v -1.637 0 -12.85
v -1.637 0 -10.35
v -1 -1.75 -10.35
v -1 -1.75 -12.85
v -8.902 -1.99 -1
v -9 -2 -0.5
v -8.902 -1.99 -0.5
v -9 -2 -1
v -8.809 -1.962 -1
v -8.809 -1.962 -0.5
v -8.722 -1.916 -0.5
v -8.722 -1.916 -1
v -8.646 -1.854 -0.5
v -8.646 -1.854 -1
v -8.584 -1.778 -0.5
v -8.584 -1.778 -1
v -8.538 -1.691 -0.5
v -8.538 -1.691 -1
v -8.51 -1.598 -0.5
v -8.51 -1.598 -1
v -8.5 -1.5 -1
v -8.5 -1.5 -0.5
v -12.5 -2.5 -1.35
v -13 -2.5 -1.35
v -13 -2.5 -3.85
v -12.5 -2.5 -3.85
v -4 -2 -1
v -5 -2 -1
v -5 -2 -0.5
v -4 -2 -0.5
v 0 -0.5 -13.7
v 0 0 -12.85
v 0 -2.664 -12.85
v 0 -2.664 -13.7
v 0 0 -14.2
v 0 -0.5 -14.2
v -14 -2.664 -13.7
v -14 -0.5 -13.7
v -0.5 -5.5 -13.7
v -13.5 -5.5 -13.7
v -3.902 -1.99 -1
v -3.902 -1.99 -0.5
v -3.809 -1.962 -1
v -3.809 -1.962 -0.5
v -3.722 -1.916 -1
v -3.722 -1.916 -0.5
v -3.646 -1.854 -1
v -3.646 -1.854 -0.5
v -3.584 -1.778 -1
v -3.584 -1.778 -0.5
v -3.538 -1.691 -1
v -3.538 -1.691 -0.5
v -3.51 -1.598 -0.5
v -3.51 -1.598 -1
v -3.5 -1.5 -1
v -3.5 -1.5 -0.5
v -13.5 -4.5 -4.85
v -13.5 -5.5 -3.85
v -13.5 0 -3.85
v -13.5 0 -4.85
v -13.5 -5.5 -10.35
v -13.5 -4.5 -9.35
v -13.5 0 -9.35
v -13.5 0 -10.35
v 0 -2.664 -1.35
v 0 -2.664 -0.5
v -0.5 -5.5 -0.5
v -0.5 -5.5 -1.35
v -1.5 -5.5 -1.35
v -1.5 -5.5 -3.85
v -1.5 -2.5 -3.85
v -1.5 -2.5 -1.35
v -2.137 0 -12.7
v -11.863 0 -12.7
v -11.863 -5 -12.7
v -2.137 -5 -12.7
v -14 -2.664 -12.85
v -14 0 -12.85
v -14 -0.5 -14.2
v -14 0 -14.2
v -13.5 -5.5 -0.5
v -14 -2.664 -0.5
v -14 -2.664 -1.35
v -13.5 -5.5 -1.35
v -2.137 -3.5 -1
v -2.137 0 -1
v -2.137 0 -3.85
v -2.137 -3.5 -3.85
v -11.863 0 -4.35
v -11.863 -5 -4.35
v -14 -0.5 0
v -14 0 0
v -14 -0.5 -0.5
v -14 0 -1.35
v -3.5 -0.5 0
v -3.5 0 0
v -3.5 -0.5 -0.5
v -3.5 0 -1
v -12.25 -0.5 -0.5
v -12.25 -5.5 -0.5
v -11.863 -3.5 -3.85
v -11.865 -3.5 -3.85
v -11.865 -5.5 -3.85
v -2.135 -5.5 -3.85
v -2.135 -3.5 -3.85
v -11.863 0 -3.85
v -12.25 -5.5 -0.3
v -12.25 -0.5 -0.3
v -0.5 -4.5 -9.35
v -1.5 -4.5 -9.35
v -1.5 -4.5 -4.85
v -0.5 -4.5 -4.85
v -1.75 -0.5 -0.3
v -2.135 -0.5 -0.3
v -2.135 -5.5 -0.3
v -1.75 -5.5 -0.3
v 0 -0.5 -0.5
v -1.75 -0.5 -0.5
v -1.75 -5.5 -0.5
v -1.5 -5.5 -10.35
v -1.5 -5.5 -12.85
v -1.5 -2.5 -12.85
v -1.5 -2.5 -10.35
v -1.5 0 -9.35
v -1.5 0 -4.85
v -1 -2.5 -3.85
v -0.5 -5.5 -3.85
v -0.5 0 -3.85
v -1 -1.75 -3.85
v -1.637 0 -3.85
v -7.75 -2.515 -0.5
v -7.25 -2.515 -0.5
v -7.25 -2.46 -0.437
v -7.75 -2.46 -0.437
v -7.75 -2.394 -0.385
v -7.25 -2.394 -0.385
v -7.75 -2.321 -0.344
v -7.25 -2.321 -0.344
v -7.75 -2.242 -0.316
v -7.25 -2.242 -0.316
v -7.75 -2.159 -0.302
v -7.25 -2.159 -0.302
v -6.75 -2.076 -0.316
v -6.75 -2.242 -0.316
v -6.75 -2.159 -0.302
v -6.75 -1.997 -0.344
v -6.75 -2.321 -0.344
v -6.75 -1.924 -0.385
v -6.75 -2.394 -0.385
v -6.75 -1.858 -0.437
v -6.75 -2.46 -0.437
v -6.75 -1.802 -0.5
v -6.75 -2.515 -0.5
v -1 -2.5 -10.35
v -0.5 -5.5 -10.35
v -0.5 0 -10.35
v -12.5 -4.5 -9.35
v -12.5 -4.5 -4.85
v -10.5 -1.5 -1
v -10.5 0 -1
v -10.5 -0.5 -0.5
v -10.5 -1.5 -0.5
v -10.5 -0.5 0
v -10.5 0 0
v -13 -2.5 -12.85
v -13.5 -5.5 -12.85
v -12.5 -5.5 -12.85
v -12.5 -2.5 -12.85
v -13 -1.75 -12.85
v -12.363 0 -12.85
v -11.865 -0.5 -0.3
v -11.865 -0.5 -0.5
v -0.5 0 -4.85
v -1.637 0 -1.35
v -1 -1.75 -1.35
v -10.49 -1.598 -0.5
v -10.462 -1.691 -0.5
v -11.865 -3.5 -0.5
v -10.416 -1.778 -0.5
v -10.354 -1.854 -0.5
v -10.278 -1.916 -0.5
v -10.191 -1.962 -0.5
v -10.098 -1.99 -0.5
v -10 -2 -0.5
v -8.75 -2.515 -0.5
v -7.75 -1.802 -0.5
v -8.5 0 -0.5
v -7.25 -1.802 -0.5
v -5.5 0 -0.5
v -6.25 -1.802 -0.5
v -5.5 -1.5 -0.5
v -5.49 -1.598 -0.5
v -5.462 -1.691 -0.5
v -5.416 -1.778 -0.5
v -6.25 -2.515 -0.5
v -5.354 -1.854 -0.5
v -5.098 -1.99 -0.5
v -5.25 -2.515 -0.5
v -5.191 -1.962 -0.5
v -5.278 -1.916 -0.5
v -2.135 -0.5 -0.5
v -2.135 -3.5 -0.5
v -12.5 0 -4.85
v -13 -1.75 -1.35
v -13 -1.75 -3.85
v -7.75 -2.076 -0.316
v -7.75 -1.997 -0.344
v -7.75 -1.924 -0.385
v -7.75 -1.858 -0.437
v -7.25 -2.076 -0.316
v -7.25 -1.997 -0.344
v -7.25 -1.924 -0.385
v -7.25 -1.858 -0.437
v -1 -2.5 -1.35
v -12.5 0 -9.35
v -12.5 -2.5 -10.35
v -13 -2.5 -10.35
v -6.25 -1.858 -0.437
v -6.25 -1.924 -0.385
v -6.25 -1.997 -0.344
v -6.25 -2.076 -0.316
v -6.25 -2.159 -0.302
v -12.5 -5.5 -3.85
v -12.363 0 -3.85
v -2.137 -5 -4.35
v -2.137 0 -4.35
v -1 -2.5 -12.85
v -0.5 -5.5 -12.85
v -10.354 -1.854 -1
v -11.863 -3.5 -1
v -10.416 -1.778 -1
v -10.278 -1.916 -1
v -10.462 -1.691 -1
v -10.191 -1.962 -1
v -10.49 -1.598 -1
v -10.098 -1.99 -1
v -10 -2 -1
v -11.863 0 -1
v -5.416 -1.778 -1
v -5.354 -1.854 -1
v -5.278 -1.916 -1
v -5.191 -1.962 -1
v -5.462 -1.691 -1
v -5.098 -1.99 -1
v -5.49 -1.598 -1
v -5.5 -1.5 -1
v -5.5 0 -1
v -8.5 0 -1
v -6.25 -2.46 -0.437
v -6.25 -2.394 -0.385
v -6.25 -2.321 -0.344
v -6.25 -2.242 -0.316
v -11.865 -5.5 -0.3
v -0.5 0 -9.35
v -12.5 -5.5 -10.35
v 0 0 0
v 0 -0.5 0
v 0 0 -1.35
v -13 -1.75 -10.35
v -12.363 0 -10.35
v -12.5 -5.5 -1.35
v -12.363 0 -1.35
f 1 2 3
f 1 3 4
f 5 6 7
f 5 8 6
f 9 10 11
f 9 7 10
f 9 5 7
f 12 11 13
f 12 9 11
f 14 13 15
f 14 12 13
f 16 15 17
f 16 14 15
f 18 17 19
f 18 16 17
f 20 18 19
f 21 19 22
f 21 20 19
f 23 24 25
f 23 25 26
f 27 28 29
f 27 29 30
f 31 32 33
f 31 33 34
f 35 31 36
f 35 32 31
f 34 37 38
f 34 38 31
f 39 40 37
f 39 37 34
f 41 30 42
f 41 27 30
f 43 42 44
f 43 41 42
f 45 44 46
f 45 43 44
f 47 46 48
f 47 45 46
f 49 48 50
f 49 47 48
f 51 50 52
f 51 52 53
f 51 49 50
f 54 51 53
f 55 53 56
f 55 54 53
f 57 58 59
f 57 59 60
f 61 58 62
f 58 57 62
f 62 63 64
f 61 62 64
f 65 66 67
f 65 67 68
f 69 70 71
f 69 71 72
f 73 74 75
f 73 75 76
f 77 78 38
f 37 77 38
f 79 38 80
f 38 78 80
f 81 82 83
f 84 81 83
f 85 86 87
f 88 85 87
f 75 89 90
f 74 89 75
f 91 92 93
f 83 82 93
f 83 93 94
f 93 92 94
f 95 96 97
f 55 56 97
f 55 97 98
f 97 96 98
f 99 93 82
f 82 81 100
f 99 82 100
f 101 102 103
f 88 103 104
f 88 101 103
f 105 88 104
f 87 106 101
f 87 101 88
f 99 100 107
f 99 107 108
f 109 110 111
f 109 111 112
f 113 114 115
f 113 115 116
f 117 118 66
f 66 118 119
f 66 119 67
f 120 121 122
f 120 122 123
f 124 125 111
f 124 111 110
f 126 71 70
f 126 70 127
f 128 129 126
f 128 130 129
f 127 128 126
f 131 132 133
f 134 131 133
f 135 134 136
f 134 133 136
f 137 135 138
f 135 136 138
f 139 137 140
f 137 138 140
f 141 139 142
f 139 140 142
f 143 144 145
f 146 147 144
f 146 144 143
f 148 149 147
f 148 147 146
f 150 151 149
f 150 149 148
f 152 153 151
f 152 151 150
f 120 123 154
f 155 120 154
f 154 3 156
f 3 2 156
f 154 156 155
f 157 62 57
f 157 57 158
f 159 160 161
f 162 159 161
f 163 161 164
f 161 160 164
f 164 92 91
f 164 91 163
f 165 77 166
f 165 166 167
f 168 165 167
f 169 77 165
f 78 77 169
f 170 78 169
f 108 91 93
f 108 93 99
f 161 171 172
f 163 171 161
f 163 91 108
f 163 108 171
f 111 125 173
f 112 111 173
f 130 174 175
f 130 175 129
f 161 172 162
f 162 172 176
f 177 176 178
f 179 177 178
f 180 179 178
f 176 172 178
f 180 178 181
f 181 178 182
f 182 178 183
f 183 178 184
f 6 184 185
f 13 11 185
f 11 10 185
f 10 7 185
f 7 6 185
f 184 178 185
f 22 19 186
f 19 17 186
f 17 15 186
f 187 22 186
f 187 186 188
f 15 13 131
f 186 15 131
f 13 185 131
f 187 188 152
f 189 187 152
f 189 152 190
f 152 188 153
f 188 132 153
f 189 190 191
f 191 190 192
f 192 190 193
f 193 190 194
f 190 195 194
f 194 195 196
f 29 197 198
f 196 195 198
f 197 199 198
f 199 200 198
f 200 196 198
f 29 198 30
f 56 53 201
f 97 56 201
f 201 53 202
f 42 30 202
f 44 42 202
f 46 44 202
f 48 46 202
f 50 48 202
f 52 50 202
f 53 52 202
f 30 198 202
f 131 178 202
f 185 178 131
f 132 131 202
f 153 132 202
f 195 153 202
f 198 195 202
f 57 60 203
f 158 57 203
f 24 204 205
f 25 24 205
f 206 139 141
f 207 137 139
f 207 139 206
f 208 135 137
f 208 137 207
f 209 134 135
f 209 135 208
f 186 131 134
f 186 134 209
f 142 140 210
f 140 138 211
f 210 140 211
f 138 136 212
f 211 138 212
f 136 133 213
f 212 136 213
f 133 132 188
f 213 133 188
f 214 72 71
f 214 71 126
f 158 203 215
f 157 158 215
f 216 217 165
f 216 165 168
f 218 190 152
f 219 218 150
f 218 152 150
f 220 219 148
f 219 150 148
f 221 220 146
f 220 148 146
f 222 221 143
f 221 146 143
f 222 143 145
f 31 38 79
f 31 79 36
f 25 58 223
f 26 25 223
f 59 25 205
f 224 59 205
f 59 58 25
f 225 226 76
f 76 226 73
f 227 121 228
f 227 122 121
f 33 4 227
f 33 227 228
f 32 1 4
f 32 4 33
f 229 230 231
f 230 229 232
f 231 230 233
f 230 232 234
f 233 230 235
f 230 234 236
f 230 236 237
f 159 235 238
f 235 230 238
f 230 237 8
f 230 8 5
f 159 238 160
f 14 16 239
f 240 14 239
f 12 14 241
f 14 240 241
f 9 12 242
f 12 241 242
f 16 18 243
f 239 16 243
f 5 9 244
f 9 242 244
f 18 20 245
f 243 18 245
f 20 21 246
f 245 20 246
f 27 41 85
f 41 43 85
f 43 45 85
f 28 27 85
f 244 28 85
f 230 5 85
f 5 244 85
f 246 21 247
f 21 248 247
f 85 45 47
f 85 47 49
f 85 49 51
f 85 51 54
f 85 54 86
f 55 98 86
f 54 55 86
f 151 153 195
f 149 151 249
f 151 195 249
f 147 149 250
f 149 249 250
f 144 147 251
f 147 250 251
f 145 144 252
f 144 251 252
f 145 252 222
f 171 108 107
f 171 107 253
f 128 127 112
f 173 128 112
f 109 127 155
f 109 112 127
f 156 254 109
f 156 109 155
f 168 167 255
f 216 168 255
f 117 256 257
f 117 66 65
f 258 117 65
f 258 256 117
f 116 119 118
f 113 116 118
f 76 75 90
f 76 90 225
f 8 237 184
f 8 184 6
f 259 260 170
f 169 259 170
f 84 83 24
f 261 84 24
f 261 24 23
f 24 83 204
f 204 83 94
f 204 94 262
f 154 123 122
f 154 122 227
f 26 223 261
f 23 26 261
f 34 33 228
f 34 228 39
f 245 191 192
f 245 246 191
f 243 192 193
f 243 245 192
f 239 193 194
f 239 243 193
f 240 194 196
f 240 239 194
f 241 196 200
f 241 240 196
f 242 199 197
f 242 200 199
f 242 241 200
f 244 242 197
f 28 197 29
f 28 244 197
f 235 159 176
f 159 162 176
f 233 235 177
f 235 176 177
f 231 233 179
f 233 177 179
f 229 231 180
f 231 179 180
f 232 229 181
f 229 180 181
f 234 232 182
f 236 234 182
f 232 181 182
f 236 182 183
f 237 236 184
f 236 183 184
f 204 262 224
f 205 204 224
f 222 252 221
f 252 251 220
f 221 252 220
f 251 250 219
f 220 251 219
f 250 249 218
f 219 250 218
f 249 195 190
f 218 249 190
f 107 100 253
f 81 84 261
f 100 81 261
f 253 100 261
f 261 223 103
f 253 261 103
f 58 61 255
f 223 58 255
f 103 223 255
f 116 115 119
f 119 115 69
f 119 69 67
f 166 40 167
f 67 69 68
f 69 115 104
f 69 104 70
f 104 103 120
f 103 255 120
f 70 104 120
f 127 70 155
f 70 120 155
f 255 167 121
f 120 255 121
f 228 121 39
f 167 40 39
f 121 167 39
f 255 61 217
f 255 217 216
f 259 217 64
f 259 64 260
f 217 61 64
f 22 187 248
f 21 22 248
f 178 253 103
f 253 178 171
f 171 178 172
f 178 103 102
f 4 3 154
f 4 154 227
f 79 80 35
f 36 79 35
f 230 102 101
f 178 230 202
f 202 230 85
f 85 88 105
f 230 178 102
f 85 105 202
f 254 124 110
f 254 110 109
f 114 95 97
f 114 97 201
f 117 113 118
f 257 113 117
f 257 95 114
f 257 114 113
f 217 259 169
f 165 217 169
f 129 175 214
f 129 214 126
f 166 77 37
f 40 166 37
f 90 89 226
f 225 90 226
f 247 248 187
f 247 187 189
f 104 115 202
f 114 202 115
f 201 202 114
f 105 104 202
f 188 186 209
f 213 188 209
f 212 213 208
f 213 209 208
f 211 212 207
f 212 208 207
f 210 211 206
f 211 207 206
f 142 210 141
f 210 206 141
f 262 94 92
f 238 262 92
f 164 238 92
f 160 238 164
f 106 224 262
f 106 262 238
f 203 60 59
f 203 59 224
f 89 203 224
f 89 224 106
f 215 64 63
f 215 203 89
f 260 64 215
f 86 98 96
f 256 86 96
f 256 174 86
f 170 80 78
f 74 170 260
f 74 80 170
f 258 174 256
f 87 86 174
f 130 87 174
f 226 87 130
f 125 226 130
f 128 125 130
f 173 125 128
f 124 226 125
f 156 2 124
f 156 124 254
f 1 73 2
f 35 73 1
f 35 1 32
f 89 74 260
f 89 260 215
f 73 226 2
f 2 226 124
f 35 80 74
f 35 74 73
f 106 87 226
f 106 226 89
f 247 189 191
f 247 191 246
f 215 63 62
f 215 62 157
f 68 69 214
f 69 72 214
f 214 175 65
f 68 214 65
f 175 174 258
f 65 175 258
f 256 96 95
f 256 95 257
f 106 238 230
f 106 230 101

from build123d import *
from OCP.BRepFilletAPI import BRepFilletAPI_MakeChamfer

# Parameters (mm, degrees)
SKETCH1_W           = 14
SKETCH1_H           = 14.2
BOSS_EXTRUDE2_DEPTH = 5.5
SKETCH2_W           = 1
SKETCH2_H           = 2.5
CUT_EXTRUDE1_DEPTH  = 2.5
SKETCH3_W           = 1.5
SKETCH3_H           = 2.5
CUT_EXTRUDE2_DEPTH  = 3
SKETCH4_W           = 0.5
SKETCH4_H           = 6.5
CUT_EXTRUDE3_DEPTH  = 5.5
SKETCH5_W           = 1
SKETCH5_H           = 4.5
CUT_EXTRUDE4_DEPTH  = 4.5
CHAMFER2_SIZE       = 1.75
CHAMFER2_SIZE2      = 0.63694791
CHAMFER3_SIZE       = 1.75
CHAMFER3_SIZE2      = 0.63694791
SKETCH7_W           = 9.72610418
SKETCH7_H           = 2.85
CUT_EXTRUDE5_DEPTH  = 21.685502169
SKETCH8_W           = 9.72610418
SKETCH8_H           = 8.35
CUT_EXTRUDE6_DEPTH  = 5
CHAMFER4_SIZE       = 0.5
CHAMFER4_SIZE2      = 2.83564091
CHAMFER5_SIZE       = 0.5
CHAMFER5_SIZE2      = 2.83564091
SKETCH9_W           = 14
SKETCH9_H           = 0.5
CUT_EXTRUDE7_DEPTH  = 5
SKETCH11_W          = 2
SKETCH11_H          = 0.5
CUT_EXTRUDE11_DEPTH = 2
FILLET2_R           = 0.5
CUT_EXTRUDE12_START = -3.35
SKETCH12_W          = 9.73
SKETCH12_H          = 2
CUT_EXTRUDE12_DEPTH = 3.35
SKETCH13_W          = 0.5
SKETCH13_H          = 0.713041147
SKETCH13_W_2        = 0.385
SKETCH13_H_2        = 5
BOSS_EXTRUDE3_DEPTH = 0.2
FILLET4_R           = 0.5


with BuildPart() as part:
    # Sketch1 → Boss-Extrude2 (new body)
    with BuildSketch(Plane(origin=(0, 0, 0), x_dir=(1, 0, 0), z_dir=(0, 1, 0))):
        with Locations((-7, 7.1)):
            Rectangle(SKETCH1_W, SKETCH1_H)
    extrude(amount=-BOSS_EXTRUDE2_DEPTH)

    # Sketch2 → Cut-Extrude1 (cut)
    with BuildSketch(Plane(origin=(0, 0, 0), x_dir=(1, 0, 0), z_dir=(0, 1, 0))):
        with Locations((-13.5, 11.6)):
            Rectangle(SKETCH2_W, SKETCH2_H)
        with Locations((-0.5, 11.6)):
            Rectangle(SKETCH2_W, SKETCH2_H)
        with Locations((-13.5, 2.6)):
            Rectangle(SKETCH2_W, SKETCH2_H)
        with Locations((-0.5, 2.6)):
            Rectangle(SKETCH2_W, SKETCH2_H)
    extrude(amount=-CUT_EXTRUDE1_DEPTH, mode=Mode.SUBTRACT)

    # Sketch3 → Cut-Extrude2 (cut)
    with BuildSketch(Plane.XZ.offset(5.5)):
        with Locations((-13.25, -2.6)):
            Rectangle(SKETCH3_W, SKETCH3_H)
        with Locations((-0.75, -2.6)):
            Rectangle(SKETCH3_W, SKETCH3_H)
        with Locations((-0.75, -11.6)):
            Rectangle(SKETCH3_W, SKETCH3_H)
        with Locations((-13.25, -11.6)):
            Rectangle(SKETCH3_W, SKETCH3_H)
    extrude(amount=-CUT_EXTRUDE2_DEPTH, mode=Mode.SUBTRACT)

    # Sketch4 → Cut-Extrude3 (cut)
    with BuildSketch(Plane(origin=(0, 0, 0), x_dir=(1, 0, 0), z_dir=(0, 1, 0))):
        with Locations((-0.25, 7.1)):
            Rectangle(SKETCH4_W, SKETCH4_H)
        with Locations((-13.75, 7.1)):
            Rectangle(SKETCH4_W, SKETCH4_H)
    extrude(amount=-CUT_EXTRUDE3_DEPTH, mode=Mode.SUBTRACT)

    # Sketch5 → Cut-Extrude4 (cut)
    with BuildSketch(Plane(origin=(0, 0, 0), x_dir=(1, 0, 0), z_dir=(0, 1, 0))):
        with Locations((-13, 7.1)):
            Rectangle(SKETCH5_W, SKETCH5_H)
        with Locations((-1, 7.1)):
            Rectangle(SKETCH5_W, SKETCH5_H)
    extrude(amount=-CUT_EXTRUDE4_DEPTH, mode=Mode.SUBTRACT)

    # Chamfer2: one chamfer whose edges measure the first distance from different faces: ONE call of the kernel's chamfer builder (chamfer() names one face for all edges)
    chamfer2_edges_1 = [part.edges().sort_by_distance(p)[0] for p in [
        (-13, 0, -2.6),
    ]]
    chamfer2_side_1 = [part.faces().sort_by_distance(p)[0] for p in [
        (-13, -1.25, -2.6),
    ]]
    chamfer2_edges_2 = [part.edges().sort_by_distance(p)[0] for p in [
        (-13, 0, -11.6),
    ]]
    chamfer2_side_2 = [part.faces().sort_by_distance(p)[0] for p in [
        (-13, -1.25, -11.6),
    ]]
    chamfer2 = BRepFilletAPI_MakeChamfer(part.part.solid().wrapped)
    for e in chamfer2_edges_1:
        chamfer2.Add(CHAMFER2_SIZE, CHAMFER2_SIZE2, e.wrapped, chamfer2_side_1[0].wrapped)  # the first distance lies on this face
    for e in chamfer2_edges_2:
        chamfer2.Add(CHAMFER2_SIZE, CHAMFER2_SIZE2, e.wrapped, chamfer2_side_2[0].wrapped)  # the first distance lies on this face
    add(Compound.cast(chamfer2.Shape()), mode=Mode.REPLACE)

    # Chamfer3: one chamfer whose edges measure the first distance from different faces: ONE call of the kernel's chamfer builder (chamfer() names one face for all edges)
    chamfer3_edges_1 = [part.edges().sort_by_distance(p)[0] for p in [
        (-1, 0, -11.6),
    ]]
    chamfer3_side_1 = [part.faces().sort_by_distance(p)[0] for p in [
        (-1, -1.25, -11.6),
    ]]
    chamfer3_edges_2 = [part.edges().sort_by_distance(p)[0] for p in [
        (-1, 0, -2.6),
    ]]
    chamfer3_side_2 = [part.faces().sort_by_distance(p)[0] for p in [
        (-1, -1.25, -2.6),
    ]]
    chamfer3 = BRepFilletAPI_MakeChamfer(part.part.solid().wrapped)
    for e in chamfer3_edges_1:
        chamfer3.Add(CHAMFER3_SIZE, CHAMFER3_SIZE2, e.wrapped, chamfer3_side_1[0].wrapped)  # the first distance lies on this face
    for e in chamfer3_edges_2:
        chamfer3.Add(CHAMFER3_SIZE, CHAMFER3_SIZE2, e.wrapped, chamfer3_side_2[0].wrapped)  # the first distance lies on this face
    add(Compound.cast(chamfer3.Shape()), mode=Mode.REPLACE)

    # Sketch7 → Cut-Extrude5 (cut, through all)
    with BuildSketch(Plane(origin=(0, 0, 0), x_dir=(1, 0, 0), z_dir=(0, 1, 0))):
        with Locations((-7, 2.425)):
            Rectangle(SKETCH7_W, SKETCH7_H)
    extrude(amount=-CUT_EXTRUDE5_DEPTH, mode=Mode.SUBTRACT)

    # Sketch8 → Cut-Extrude6 (cut)
    with BuildSketch(Plane(origin=(0, 0, 0), x_dir=(1, 0, 0), z_dir=(0, 1, 0))):
        with Locations((-7, 8.525)):
            Rectangle(SKETCH8_W, SKETCH8_H)
    extrude(amount=-CUT_EXTRUDE6_DEPTH, mode=Mode.SUBTRACT)

    # Chamfer4
    chamfer4_edges = [part.edges().sort_by_distance(p)[0] for p in [
        (0, -5.5, -0.675),
        (0, -5.5, -13.525),
    ]]
    chamfer4_side = [part.faces().sort_by_distance(p)[0] for p in [
        (-7, -5.5, -7.966343482),
    ]]
    chamfer(chamfer4_edges, length=CHAMFER4_SIZE, length2=CHAMFER4_SIZE2, reference=chamfer4_side[0])

    # Chamfer5
    chamfer5_edges = [part.edges().sort_by_distance(p)[0] for p in [
        (-14, -5.5, -13.525),
        (-14, -5.5, -0.675),
    ]]
    chamfer5_side = [part.faces().sort_by_distance(p)[0] for p in [
        (-7.06147516, -5.5, -7.974233646),
    ]]
    chamfer(chamfer5_edges, length=CHAMFER5_SIZE, length2=CHAMFER5_SIZE2, reference=chamfer5_side[0])

    # Sketch9 → Cut-Extrude7 (cut)
    with BuildSketch(Plane.XZ.offset(5.5)):
        with Locations((-7, -0.25)):
            Rectangle(SKETCH9_W, SKETCH9_H)
        with Locations((-7, -13.95)):
            Rectangle(SKETCH9_W, SKETCH9_H)
    extrude(amount=-CUT_EXTRUDE7_DEPTH, mode=Mode.SUBTRACT)

    # Sketch11 → Cut-Extrude11 (cut)
    with BuildSketch(Plane(origin=(0, 0, 0), x_dir=(1, 0, 0), z_dir=(0, 1, 0))):
        with Locations((-9.5, 0.75)):
            Rectangle(SKETCH11_W, SKETCH11_H)
        Polygon((-10.5, 0.5), (-10.5, 0), (-3.5, 0), (-3.5, 0.5), (-5.5, 0.5), (-8.5, 0.5), align=None)
        with Locations((-4.5, 0.75)):
            Rectangle(SKETCH11_W, SKETCH11_H)
    extrude(amount=-CUT_EXTRUDE11_DEPTH, mode=Mode.SUBTRACT)

    # Fillet2
    fillet2_edges = [part.edges().sort_by_distance(p)[0] for p in [
        (-10.5, -2, -0.75),
        (-5.5, -2, -0.75),
        (-3.5, -2, -0.75),
        (-8.5, -2, -0.75),
    ]]
    fillet(fillet2_edges, radius=FILLET2_R)

    # Sketch12 → Cut-Extrude12 (cut)
    with BuildSketch(Plane.XY.offset(-0.5).offset(CUT_EXTRUDE12_START)):
        with Locations((-7, -4.5)):
            Rectangle(SKETCH12_W, SKETCH12_H)
    extrude(amount=CUT_EXTRUDE12_DEPTH, mode=Mode.SUBTRACT)

    # Sketch13 → Boss-Extrude3 (add)
    with BuildSketch(Plane.XY.offset(-0.5)):
        with Locations((-7.5, -2.158926418)):
            Rectangle(SKETCH13_W, SKETCH13_H)
        with Locations((-6.5, -2.158926418)):
            Rectangle(SKETCH13_W, SKETCH13_H)
        with Locations((-1.9425, -3)):
            Rectangle(SKETCH13_W_2, SKETCH13_H_2)
        with Locations((-12.0575, -3)):
            Rectangle(SKETCH13_W_2, SKETCH13_H_2)
    extrude(amount=BOSS_EXTRUDE3_DEPTH)

    # Fillet4
    # the kernel refuses this fillet: 0.5 mm, written as the material it takes off along each edge
    with BuildSketch(Plane(origin=(-8.75, -1.802405844, -0.3), x_dir=(0, -2.6074697955836492e-11, -1.0), z_dir=(1, 0, 0)), Plane(origin=(-7.75, -1.802405844, -0.3), x_dir=(0, -2.6074697955836492e-11, -1.0), z_dir=(1, 0, 0))) as fillet4_piece_1:
        with BuildLine():
            CenterArc((0.5, -0.4), FILLET4_R, 126.869897647, 53.130102355)
            Line((0, -0.4), (-0.01, -0.4))
            Line((-0.01, -0.4), (-0.01, 0))
            Line((-0.01, 0), (0, 0.01))
            ThreePointArc((0, 0.01), (0.1, 0.01), (0.194, 0.008))
            Line((0.194, 0.008), (0.2, 0))
        make_face()
    extrude(amount=2.5, mode=Mode.SUBTRACT)
    with BuildSketch(Plane(origin=(-5.25, -2.515446991, -0.3), x_dir=(0, 1, 0), z_dir=(-1, 0, 0)), Plane(origin=(-6.25, -2.515446991, -0.3), x_dir=(0, 1, 0), z_dir=(-1, 0, 0))) as fillet4_piece_2:
        with BuildLine():
            CenterArc((0.4, 0.5), FILLET4_R, 216.869897645, 53.130102355)
            Line((0, 0.2), (-0.008, 0.194))
            ThreePointArc((-0.008, 0.194), (-0.01, 0.1), (-0.01, 0))
            Line((-0.01, 0), (0, -0.01))
            Line((0, -0.01), (0.4, -0.01))
            Line((0.4, -0.01), (0.4, 0))
        make_face()
    extrude(amount=2.5, mode=Mode.SUBTRACT)


solid = part.part
